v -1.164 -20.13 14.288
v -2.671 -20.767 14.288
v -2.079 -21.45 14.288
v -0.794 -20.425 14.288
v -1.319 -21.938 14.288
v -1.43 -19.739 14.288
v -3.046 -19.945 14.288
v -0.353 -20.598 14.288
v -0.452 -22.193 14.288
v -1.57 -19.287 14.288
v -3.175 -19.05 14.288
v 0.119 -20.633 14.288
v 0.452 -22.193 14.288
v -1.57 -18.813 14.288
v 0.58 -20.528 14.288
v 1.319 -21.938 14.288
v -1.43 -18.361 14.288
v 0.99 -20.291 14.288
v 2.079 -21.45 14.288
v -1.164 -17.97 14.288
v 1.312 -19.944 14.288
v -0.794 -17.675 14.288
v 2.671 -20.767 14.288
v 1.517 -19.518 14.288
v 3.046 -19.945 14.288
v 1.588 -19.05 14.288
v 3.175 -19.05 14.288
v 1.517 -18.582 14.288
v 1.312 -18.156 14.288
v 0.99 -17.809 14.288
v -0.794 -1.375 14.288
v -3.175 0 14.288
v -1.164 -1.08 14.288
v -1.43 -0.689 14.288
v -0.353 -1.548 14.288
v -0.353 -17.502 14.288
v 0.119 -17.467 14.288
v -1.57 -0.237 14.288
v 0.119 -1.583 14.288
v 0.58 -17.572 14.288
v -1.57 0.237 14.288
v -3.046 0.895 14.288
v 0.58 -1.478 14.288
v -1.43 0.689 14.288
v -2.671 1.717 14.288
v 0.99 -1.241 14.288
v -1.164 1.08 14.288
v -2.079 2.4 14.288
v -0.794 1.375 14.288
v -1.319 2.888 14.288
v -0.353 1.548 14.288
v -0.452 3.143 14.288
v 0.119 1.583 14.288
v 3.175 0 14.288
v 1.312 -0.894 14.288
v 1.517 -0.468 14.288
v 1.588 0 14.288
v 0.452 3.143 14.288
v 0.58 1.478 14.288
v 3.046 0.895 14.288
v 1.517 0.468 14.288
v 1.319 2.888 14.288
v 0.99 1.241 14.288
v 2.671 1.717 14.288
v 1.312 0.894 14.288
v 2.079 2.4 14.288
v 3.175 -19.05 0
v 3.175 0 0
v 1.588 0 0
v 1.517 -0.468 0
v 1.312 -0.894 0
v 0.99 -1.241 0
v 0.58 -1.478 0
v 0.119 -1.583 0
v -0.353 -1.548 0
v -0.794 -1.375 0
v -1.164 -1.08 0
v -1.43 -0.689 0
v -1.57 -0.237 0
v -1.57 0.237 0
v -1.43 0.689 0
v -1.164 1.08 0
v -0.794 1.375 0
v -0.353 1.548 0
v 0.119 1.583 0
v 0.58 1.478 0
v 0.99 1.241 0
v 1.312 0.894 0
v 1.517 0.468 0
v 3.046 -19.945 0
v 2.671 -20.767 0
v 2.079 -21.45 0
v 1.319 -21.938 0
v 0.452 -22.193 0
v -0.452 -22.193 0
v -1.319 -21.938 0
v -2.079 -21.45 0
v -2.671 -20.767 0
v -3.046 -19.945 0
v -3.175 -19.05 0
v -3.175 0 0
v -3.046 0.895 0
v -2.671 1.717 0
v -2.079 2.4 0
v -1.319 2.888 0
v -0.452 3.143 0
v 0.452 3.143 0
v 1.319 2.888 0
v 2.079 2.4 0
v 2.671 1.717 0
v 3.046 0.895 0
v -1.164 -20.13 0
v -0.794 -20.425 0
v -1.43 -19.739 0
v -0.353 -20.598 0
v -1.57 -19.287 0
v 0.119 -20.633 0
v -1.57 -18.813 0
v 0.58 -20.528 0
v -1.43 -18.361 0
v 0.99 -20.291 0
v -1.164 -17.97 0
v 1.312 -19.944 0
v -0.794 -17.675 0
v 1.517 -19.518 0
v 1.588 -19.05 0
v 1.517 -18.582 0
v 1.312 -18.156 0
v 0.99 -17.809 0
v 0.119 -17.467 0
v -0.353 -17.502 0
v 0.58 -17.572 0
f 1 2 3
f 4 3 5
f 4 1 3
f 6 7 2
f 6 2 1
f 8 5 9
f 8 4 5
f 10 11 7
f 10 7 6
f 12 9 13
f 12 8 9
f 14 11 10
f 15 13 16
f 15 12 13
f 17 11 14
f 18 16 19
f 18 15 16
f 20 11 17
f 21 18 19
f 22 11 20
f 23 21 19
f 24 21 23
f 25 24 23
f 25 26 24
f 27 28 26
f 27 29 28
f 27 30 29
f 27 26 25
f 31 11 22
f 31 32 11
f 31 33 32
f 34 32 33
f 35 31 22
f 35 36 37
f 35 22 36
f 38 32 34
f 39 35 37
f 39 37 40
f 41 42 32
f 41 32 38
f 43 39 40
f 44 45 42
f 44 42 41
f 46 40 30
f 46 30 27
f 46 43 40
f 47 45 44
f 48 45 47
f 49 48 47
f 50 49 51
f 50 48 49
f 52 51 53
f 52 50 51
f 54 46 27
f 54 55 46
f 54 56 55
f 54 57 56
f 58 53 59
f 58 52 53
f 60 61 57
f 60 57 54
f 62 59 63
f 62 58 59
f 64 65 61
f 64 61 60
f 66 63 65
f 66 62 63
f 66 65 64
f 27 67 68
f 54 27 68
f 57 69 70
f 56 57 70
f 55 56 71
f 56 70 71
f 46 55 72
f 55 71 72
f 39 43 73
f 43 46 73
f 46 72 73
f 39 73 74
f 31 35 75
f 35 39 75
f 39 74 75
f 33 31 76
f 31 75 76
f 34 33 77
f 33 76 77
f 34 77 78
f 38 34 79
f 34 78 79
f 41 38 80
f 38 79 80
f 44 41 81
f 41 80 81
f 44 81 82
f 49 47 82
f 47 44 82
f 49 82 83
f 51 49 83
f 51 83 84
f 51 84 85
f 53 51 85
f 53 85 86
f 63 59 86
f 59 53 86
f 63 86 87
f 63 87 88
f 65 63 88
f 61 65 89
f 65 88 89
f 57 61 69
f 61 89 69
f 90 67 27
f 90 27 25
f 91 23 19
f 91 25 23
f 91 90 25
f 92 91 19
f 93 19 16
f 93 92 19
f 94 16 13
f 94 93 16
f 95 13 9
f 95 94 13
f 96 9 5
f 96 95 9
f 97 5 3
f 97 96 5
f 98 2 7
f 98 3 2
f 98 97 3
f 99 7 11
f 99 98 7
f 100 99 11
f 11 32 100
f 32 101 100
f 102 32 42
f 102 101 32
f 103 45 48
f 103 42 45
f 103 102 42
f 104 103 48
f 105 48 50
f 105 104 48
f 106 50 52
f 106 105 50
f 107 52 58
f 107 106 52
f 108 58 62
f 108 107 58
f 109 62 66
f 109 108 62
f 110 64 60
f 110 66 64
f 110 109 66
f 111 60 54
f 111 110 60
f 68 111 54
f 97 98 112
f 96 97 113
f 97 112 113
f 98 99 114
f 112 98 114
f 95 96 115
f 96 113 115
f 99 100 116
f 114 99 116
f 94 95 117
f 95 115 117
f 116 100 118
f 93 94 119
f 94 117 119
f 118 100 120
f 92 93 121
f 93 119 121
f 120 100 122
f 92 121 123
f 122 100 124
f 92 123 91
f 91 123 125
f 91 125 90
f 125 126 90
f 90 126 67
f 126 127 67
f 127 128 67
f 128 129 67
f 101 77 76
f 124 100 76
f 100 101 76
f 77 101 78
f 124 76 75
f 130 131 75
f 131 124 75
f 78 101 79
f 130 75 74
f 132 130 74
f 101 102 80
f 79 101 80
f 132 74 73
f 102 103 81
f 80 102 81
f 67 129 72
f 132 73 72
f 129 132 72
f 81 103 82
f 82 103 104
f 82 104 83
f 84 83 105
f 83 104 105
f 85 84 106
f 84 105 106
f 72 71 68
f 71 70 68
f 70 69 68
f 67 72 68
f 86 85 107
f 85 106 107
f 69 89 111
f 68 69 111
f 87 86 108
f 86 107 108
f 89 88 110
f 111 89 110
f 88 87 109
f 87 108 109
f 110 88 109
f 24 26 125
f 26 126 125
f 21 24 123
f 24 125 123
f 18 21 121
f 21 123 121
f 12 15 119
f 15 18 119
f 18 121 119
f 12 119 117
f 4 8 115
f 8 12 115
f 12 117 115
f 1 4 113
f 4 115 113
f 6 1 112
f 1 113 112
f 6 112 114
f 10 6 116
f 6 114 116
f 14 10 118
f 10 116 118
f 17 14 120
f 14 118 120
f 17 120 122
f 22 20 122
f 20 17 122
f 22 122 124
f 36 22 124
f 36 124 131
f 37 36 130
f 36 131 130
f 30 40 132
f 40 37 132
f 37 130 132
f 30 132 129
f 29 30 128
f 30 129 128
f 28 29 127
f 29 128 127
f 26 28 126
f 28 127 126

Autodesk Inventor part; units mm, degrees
ref_plane "YZ Plane" through (0, 0, 0) normal (1, 0, 0) x (0, 1, 0)
ref_plane "XZ Plane" through (0, 0, 0) normal (0, 1, 0) x (-1, 0, 0)
ref_plane "XY Plane" through (0, 0, 0) normal (0, 0, 1) x (1, 0, 0)
sketch "Sketch1" plane through (0, 0, 0) normal (0, 0, 1) x (1, 0, 0)
  line L0 (0, 0) -> (0, -19.05) construction
  line L1 (-3.175, 0) -> (-3.175, -19.05)
  line L2 (3.175, -19.05) -> (3.175, 0)
  arc A0 (3.175, 0) -> (-3.175, 0) centre (0, 0) ccw
  arc A1 (-3.175, -19.05) -> (3.175, -19.05) centre (0, -19.05) ccw
  circle A2 centre (0, 0) radius 1.5875
  circle A3 centre (0, -19.05) radius 1.5875
  point P0 (0, -9.525)
  dimension "d0" = 19.05
  dimension "d1" = 6.35
  dimension "d2" = 3.175
  dimension "d3" = 3.175
extrude "Extrusion1" add sketch "Sketch1" along normal blind 14.2875
properties part number "Bracket - 1" material "UHMW, White"
